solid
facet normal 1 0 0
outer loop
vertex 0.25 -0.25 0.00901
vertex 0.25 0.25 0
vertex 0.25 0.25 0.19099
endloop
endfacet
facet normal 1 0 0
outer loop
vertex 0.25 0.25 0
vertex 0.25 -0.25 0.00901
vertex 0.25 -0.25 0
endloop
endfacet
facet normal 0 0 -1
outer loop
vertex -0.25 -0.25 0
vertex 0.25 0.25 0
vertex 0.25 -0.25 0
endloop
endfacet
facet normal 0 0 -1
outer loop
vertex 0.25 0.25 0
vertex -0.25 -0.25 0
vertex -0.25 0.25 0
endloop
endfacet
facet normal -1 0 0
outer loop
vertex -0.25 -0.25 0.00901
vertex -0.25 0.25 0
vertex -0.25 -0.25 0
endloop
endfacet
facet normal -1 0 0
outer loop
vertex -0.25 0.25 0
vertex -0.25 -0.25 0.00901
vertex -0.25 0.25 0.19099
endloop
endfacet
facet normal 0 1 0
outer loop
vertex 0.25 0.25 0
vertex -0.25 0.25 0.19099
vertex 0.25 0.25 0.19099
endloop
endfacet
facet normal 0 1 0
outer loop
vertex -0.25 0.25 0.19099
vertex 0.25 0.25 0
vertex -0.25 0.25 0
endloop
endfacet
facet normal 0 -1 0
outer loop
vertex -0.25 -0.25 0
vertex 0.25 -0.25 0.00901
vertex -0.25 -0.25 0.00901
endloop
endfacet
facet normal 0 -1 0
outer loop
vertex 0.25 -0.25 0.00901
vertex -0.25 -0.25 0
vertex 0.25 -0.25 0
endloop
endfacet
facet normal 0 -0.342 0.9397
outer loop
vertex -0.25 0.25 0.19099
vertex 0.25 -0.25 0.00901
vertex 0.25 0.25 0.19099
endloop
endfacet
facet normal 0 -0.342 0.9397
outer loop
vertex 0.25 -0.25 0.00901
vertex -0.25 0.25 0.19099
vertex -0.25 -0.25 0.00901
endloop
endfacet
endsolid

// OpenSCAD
smallGridSize = 0.5;
boardOffset = 0.10;
boardAngle = 20;

difference() {
  translate([0, 0, smallGridSize/4])
    cube(size=[smallGridSize, smallGridSize, smallGridSize/2], center=true);
  translate([0, 0, boardOffset]) rotate([boardAngle, 0, 0]) translate([0, 0, smallGridSize/2])
    cube(size=[smallGridSize*2, smallGridSize*2, smallGridSize], center=true);
}
